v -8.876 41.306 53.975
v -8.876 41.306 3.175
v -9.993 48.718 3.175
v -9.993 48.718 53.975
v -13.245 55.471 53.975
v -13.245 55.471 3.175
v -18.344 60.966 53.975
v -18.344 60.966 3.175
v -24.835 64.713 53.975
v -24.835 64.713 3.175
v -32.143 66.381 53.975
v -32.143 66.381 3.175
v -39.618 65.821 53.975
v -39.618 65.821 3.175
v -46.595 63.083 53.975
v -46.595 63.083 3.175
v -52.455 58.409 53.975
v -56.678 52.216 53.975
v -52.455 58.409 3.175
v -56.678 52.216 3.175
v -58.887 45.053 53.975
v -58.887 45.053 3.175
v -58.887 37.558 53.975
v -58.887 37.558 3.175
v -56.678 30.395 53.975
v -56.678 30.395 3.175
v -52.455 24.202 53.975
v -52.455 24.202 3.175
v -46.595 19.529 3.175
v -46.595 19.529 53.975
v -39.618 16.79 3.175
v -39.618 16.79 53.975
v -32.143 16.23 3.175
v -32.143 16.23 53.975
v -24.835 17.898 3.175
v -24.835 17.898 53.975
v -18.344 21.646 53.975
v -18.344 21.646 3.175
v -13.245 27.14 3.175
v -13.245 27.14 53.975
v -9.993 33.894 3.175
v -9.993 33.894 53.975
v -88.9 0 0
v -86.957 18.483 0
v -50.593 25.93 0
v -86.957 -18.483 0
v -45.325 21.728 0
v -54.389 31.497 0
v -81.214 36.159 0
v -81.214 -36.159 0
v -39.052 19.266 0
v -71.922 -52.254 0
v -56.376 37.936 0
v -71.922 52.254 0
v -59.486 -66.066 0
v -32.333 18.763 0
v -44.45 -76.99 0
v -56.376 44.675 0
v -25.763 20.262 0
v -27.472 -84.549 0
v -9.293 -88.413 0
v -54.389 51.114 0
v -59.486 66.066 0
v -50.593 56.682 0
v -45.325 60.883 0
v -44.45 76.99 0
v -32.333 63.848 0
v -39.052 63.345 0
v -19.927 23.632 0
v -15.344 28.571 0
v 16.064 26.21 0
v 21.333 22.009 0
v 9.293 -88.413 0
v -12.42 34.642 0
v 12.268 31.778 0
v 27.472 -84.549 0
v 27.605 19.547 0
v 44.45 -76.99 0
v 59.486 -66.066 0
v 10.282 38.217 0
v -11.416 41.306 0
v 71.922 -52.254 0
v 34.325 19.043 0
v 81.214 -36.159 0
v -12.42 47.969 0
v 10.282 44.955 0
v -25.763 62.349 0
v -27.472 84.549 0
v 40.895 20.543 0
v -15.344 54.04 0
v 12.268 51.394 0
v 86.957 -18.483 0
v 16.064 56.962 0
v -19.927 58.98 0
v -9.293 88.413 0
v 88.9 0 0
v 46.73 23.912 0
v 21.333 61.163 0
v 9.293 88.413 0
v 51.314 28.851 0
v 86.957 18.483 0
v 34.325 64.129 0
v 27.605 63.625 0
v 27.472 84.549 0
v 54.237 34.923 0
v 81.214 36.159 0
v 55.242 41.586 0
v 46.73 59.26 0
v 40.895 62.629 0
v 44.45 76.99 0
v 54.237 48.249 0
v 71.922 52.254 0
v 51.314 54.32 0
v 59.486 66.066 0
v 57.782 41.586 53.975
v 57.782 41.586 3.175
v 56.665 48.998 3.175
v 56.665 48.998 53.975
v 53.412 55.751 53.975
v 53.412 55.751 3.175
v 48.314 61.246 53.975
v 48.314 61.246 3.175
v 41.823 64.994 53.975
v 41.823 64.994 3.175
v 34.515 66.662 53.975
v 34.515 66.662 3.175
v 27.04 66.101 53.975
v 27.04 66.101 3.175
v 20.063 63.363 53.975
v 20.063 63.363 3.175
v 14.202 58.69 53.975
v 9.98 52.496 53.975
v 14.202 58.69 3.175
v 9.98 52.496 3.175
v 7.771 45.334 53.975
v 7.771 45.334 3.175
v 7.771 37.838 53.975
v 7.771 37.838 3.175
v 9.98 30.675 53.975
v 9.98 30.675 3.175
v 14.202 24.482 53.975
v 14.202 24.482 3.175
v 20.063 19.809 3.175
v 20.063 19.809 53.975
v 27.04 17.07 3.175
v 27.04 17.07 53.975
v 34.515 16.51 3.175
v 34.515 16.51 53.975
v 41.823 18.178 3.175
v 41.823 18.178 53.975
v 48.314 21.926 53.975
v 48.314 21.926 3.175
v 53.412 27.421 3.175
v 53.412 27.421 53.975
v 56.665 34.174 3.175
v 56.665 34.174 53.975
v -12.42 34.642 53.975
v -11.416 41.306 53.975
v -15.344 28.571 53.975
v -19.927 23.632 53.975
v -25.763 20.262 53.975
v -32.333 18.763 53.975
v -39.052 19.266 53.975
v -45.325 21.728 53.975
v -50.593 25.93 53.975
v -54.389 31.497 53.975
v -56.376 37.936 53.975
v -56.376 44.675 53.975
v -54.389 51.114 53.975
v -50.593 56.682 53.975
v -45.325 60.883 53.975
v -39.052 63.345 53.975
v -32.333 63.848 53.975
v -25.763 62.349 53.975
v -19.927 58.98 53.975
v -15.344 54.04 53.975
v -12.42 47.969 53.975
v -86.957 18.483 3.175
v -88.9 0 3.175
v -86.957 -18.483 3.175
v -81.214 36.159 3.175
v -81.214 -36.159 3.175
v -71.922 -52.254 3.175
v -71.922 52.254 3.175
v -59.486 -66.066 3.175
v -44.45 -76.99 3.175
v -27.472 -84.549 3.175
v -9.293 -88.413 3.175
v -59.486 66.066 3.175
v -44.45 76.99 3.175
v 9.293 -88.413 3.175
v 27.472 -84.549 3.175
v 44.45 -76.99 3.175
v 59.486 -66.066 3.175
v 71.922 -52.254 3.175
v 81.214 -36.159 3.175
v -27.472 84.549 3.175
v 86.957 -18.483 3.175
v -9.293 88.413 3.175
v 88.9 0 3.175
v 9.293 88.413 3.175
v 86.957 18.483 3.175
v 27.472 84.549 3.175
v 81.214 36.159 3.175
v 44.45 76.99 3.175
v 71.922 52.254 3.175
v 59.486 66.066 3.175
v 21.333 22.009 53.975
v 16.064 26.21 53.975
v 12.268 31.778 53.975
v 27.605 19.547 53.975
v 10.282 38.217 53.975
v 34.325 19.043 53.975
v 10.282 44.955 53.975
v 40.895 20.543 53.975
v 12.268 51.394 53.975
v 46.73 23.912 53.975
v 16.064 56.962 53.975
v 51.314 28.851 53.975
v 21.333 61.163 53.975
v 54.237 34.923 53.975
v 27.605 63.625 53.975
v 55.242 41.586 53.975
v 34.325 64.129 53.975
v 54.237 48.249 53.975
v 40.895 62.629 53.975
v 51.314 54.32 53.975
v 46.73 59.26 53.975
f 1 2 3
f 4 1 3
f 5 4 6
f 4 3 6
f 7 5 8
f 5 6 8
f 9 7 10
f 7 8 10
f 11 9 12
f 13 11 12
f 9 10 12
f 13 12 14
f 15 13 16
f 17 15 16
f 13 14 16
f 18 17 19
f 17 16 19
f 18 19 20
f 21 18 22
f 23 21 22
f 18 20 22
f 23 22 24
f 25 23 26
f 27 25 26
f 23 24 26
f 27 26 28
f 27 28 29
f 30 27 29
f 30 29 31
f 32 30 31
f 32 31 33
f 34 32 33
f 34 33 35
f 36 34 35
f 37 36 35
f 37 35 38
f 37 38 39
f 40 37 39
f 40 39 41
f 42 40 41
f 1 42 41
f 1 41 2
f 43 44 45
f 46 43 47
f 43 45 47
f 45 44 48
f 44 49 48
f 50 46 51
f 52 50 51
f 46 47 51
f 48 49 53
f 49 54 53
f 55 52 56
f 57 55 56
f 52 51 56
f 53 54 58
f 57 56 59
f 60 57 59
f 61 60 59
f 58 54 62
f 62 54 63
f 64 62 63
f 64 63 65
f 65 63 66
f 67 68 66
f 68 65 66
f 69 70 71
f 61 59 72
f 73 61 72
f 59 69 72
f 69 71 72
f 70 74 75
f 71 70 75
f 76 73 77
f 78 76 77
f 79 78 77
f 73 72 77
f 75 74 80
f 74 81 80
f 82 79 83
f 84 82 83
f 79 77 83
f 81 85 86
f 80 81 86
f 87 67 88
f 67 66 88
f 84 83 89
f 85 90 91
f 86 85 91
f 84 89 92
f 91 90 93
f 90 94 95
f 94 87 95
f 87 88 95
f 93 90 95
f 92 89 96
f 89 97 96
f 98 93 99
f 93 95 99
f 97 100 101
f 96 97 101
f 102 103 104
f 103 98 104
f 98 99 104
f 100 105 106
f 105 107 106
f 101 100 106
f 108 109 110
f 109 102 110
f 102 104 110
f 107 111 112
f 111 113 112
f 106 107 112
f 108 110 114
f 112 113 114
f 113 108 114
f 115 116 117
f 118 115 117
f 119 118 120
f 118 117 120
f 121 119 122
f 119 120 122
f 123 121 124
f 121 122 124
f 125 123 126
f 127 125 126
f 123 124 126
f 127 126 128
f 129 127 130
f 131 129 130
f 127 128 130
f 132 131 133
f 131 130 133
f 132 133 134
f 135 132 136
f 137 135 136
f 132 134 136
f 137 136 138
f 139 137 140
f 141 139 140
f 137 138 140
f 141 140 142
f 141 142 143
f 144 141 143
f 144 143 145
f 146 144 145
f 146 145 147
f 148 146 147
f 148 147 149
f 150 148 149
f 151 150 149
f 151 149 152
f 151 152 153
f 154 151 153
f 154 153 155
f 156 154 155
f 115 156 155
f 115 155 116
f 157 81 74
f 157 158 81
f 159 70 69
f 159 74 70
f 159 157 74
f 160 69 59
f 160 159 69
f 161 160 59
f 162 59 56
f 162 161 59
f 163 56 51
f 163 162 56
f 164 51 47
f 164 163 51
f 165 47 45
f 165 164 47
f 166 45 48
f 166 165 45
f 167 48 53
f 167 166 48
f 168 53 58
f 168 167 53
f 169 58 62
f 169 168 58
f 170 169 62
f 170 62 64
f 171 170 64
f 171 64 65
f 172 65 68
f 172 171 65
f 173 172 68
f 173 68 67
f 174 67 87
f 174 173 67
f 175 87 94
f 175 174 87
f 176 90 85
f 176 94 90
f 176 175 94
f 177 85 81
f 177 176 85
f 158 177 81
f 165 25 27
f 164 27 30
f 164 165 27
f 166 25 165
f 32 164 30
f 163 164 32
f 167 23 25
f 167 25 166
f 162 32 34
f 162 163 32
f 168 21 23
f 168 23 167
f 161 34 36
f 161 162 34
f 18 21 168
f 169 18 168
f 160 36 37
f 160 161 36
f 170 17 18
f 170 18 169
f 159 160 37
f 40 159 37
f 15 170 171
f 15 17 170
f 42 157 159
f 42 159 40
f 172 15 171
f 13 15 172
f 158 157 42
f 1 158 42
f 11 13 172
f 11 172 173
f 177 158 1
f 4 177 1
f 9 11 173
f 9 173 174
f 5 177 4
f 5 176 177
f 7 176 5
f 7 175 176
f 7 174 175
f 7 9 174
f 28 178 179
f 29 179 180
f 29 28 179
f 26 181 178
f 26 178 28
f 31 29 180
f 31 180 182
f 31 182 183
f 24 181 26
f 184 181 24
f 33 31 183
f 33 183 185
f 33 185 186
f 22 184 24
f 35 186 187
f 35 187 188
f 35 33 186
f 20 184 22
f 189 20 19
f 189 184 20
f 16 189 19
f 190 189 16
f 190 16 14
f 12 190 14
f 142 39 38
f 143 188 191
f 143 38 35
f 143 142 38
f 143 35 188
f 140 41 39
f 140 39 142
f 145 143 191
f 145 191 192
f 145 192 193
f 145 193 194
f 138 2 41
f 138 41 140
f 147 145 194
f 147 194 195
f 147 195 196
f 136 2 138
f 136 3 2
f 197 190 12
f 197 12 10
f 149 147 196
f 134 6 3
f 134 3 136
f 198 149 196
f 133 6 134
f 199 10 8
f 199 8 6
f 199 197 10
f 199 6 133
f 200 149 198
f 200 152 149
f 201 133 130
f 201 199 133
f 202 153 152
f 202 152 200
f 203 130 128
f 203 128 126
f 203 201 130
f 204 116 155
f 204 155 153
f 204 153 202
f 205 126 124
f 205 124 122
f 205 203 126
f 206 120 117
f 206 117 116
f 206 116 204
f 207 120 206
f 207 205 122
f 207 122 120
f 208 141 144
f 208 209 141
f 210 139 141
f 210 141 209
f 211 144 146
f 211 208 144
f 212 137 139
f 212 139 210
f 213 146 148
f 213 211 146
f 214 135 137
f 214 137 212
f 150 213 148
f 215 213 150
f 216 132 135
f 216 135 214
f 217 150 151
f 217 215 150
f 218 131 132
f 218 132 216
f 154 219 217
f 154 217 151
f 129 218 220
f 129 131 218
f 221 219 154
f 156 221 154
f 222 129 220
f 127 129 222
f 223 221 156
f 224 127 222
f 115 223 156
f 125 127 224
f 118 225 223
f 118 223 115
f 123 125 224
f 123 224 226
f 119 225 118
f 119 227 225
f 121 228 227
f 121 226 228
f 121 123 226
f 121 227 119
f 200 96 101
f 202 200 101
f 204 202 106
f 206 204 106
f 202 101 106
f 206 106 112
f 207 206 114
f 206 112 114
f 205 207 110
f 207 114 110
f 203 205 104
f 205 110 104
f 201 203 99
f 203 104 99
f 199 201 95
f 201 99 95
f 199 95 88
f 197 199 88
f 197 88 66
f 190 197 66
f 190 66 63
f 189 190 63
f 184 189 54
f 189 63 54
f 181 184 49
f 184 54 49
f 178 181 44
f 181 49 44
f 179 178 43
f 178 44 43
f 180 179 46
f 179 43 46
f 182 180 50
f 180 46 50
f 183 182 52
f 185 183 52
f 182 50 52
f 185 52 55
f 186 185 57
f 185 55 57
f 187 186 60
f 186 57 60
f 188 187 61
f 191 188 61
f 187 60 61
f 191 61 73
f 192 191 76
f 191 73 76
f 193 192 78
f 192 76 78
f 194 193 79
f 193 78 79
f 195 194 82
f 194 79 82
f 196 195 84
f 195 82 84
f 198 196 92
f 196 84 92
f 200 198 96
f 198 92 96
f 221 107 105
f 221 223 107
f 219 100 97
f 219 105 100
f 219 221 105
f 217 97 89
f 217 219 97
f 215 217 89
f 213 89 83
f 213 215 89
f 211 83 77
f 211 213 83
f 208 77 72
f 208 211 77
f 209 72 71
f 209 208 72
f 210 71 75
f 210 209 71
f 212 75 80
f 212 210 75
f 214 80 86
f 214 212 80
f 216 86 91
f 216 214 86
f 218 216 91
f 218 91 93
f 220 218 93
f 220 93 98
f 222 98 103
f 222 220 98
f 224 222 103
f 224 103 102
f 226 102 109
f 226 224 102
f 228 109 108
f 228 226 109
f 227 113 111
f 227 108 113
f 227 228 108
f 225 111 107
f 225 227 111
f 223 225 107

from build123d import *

# Parameters (mm, degrees)
F0_R     = 88.9
F1_DEPTH = 3.175
F2_R     = 25.146
F2_R_2   = 22.606
F3_DEPTH = 53.975
F4_DEPTH = 12.7
F5_DEPTH = 12.7


with BuildPart() as f1:
    # F0 (on Top) → F1 (new body)
    with BuildSketch(Plane.XY):
        Circle(F0_R)
    extrude(amount=F1_DEPTH)

    # F2 (on Top) → F3 (join)
    with BuildSketch(Plane.XY):
        with Locations((-34.0220481157, 41.3056388497)):
            Circle(F2_R)
        with Locations((-34.0220481157, 41.3056388497)):
            Circle(F2_R_2, mode=Mode.SUBTRACT)
        with Locations((32.6357856393, 41.5858998895)):
            Circle(F2_R)
        with Locations((32.6357856393, 41.5858998895)):
            Circle(F2_R_2, mode=Mode.SUBTRACT)
    extrude(amount=F3_DEPTH)

    # F4 (cut, symmetric): a face of the model
    f4_faces = [f1.faces().sort_by_distance(p)[0] for p in [
        (-34.0220481157, 41.3056388497, 3.175),
    ]]
    extrude(f4_faces, amount=F4_DEPTH, both=True, mode=Mode.SUBTRACT)

    # F5 (cut, symmetric): a face of the model
    f5_faces = [f1.faces().sort_by_distance(p)[0] for p in [
        (32.6357856393, 41.5858998895, 3.175),
    ]]
    extrude(f5_faces, amount=F5_DEPTH, both=True, mode=Mode.SUBTRACT)


solid = f1.part
